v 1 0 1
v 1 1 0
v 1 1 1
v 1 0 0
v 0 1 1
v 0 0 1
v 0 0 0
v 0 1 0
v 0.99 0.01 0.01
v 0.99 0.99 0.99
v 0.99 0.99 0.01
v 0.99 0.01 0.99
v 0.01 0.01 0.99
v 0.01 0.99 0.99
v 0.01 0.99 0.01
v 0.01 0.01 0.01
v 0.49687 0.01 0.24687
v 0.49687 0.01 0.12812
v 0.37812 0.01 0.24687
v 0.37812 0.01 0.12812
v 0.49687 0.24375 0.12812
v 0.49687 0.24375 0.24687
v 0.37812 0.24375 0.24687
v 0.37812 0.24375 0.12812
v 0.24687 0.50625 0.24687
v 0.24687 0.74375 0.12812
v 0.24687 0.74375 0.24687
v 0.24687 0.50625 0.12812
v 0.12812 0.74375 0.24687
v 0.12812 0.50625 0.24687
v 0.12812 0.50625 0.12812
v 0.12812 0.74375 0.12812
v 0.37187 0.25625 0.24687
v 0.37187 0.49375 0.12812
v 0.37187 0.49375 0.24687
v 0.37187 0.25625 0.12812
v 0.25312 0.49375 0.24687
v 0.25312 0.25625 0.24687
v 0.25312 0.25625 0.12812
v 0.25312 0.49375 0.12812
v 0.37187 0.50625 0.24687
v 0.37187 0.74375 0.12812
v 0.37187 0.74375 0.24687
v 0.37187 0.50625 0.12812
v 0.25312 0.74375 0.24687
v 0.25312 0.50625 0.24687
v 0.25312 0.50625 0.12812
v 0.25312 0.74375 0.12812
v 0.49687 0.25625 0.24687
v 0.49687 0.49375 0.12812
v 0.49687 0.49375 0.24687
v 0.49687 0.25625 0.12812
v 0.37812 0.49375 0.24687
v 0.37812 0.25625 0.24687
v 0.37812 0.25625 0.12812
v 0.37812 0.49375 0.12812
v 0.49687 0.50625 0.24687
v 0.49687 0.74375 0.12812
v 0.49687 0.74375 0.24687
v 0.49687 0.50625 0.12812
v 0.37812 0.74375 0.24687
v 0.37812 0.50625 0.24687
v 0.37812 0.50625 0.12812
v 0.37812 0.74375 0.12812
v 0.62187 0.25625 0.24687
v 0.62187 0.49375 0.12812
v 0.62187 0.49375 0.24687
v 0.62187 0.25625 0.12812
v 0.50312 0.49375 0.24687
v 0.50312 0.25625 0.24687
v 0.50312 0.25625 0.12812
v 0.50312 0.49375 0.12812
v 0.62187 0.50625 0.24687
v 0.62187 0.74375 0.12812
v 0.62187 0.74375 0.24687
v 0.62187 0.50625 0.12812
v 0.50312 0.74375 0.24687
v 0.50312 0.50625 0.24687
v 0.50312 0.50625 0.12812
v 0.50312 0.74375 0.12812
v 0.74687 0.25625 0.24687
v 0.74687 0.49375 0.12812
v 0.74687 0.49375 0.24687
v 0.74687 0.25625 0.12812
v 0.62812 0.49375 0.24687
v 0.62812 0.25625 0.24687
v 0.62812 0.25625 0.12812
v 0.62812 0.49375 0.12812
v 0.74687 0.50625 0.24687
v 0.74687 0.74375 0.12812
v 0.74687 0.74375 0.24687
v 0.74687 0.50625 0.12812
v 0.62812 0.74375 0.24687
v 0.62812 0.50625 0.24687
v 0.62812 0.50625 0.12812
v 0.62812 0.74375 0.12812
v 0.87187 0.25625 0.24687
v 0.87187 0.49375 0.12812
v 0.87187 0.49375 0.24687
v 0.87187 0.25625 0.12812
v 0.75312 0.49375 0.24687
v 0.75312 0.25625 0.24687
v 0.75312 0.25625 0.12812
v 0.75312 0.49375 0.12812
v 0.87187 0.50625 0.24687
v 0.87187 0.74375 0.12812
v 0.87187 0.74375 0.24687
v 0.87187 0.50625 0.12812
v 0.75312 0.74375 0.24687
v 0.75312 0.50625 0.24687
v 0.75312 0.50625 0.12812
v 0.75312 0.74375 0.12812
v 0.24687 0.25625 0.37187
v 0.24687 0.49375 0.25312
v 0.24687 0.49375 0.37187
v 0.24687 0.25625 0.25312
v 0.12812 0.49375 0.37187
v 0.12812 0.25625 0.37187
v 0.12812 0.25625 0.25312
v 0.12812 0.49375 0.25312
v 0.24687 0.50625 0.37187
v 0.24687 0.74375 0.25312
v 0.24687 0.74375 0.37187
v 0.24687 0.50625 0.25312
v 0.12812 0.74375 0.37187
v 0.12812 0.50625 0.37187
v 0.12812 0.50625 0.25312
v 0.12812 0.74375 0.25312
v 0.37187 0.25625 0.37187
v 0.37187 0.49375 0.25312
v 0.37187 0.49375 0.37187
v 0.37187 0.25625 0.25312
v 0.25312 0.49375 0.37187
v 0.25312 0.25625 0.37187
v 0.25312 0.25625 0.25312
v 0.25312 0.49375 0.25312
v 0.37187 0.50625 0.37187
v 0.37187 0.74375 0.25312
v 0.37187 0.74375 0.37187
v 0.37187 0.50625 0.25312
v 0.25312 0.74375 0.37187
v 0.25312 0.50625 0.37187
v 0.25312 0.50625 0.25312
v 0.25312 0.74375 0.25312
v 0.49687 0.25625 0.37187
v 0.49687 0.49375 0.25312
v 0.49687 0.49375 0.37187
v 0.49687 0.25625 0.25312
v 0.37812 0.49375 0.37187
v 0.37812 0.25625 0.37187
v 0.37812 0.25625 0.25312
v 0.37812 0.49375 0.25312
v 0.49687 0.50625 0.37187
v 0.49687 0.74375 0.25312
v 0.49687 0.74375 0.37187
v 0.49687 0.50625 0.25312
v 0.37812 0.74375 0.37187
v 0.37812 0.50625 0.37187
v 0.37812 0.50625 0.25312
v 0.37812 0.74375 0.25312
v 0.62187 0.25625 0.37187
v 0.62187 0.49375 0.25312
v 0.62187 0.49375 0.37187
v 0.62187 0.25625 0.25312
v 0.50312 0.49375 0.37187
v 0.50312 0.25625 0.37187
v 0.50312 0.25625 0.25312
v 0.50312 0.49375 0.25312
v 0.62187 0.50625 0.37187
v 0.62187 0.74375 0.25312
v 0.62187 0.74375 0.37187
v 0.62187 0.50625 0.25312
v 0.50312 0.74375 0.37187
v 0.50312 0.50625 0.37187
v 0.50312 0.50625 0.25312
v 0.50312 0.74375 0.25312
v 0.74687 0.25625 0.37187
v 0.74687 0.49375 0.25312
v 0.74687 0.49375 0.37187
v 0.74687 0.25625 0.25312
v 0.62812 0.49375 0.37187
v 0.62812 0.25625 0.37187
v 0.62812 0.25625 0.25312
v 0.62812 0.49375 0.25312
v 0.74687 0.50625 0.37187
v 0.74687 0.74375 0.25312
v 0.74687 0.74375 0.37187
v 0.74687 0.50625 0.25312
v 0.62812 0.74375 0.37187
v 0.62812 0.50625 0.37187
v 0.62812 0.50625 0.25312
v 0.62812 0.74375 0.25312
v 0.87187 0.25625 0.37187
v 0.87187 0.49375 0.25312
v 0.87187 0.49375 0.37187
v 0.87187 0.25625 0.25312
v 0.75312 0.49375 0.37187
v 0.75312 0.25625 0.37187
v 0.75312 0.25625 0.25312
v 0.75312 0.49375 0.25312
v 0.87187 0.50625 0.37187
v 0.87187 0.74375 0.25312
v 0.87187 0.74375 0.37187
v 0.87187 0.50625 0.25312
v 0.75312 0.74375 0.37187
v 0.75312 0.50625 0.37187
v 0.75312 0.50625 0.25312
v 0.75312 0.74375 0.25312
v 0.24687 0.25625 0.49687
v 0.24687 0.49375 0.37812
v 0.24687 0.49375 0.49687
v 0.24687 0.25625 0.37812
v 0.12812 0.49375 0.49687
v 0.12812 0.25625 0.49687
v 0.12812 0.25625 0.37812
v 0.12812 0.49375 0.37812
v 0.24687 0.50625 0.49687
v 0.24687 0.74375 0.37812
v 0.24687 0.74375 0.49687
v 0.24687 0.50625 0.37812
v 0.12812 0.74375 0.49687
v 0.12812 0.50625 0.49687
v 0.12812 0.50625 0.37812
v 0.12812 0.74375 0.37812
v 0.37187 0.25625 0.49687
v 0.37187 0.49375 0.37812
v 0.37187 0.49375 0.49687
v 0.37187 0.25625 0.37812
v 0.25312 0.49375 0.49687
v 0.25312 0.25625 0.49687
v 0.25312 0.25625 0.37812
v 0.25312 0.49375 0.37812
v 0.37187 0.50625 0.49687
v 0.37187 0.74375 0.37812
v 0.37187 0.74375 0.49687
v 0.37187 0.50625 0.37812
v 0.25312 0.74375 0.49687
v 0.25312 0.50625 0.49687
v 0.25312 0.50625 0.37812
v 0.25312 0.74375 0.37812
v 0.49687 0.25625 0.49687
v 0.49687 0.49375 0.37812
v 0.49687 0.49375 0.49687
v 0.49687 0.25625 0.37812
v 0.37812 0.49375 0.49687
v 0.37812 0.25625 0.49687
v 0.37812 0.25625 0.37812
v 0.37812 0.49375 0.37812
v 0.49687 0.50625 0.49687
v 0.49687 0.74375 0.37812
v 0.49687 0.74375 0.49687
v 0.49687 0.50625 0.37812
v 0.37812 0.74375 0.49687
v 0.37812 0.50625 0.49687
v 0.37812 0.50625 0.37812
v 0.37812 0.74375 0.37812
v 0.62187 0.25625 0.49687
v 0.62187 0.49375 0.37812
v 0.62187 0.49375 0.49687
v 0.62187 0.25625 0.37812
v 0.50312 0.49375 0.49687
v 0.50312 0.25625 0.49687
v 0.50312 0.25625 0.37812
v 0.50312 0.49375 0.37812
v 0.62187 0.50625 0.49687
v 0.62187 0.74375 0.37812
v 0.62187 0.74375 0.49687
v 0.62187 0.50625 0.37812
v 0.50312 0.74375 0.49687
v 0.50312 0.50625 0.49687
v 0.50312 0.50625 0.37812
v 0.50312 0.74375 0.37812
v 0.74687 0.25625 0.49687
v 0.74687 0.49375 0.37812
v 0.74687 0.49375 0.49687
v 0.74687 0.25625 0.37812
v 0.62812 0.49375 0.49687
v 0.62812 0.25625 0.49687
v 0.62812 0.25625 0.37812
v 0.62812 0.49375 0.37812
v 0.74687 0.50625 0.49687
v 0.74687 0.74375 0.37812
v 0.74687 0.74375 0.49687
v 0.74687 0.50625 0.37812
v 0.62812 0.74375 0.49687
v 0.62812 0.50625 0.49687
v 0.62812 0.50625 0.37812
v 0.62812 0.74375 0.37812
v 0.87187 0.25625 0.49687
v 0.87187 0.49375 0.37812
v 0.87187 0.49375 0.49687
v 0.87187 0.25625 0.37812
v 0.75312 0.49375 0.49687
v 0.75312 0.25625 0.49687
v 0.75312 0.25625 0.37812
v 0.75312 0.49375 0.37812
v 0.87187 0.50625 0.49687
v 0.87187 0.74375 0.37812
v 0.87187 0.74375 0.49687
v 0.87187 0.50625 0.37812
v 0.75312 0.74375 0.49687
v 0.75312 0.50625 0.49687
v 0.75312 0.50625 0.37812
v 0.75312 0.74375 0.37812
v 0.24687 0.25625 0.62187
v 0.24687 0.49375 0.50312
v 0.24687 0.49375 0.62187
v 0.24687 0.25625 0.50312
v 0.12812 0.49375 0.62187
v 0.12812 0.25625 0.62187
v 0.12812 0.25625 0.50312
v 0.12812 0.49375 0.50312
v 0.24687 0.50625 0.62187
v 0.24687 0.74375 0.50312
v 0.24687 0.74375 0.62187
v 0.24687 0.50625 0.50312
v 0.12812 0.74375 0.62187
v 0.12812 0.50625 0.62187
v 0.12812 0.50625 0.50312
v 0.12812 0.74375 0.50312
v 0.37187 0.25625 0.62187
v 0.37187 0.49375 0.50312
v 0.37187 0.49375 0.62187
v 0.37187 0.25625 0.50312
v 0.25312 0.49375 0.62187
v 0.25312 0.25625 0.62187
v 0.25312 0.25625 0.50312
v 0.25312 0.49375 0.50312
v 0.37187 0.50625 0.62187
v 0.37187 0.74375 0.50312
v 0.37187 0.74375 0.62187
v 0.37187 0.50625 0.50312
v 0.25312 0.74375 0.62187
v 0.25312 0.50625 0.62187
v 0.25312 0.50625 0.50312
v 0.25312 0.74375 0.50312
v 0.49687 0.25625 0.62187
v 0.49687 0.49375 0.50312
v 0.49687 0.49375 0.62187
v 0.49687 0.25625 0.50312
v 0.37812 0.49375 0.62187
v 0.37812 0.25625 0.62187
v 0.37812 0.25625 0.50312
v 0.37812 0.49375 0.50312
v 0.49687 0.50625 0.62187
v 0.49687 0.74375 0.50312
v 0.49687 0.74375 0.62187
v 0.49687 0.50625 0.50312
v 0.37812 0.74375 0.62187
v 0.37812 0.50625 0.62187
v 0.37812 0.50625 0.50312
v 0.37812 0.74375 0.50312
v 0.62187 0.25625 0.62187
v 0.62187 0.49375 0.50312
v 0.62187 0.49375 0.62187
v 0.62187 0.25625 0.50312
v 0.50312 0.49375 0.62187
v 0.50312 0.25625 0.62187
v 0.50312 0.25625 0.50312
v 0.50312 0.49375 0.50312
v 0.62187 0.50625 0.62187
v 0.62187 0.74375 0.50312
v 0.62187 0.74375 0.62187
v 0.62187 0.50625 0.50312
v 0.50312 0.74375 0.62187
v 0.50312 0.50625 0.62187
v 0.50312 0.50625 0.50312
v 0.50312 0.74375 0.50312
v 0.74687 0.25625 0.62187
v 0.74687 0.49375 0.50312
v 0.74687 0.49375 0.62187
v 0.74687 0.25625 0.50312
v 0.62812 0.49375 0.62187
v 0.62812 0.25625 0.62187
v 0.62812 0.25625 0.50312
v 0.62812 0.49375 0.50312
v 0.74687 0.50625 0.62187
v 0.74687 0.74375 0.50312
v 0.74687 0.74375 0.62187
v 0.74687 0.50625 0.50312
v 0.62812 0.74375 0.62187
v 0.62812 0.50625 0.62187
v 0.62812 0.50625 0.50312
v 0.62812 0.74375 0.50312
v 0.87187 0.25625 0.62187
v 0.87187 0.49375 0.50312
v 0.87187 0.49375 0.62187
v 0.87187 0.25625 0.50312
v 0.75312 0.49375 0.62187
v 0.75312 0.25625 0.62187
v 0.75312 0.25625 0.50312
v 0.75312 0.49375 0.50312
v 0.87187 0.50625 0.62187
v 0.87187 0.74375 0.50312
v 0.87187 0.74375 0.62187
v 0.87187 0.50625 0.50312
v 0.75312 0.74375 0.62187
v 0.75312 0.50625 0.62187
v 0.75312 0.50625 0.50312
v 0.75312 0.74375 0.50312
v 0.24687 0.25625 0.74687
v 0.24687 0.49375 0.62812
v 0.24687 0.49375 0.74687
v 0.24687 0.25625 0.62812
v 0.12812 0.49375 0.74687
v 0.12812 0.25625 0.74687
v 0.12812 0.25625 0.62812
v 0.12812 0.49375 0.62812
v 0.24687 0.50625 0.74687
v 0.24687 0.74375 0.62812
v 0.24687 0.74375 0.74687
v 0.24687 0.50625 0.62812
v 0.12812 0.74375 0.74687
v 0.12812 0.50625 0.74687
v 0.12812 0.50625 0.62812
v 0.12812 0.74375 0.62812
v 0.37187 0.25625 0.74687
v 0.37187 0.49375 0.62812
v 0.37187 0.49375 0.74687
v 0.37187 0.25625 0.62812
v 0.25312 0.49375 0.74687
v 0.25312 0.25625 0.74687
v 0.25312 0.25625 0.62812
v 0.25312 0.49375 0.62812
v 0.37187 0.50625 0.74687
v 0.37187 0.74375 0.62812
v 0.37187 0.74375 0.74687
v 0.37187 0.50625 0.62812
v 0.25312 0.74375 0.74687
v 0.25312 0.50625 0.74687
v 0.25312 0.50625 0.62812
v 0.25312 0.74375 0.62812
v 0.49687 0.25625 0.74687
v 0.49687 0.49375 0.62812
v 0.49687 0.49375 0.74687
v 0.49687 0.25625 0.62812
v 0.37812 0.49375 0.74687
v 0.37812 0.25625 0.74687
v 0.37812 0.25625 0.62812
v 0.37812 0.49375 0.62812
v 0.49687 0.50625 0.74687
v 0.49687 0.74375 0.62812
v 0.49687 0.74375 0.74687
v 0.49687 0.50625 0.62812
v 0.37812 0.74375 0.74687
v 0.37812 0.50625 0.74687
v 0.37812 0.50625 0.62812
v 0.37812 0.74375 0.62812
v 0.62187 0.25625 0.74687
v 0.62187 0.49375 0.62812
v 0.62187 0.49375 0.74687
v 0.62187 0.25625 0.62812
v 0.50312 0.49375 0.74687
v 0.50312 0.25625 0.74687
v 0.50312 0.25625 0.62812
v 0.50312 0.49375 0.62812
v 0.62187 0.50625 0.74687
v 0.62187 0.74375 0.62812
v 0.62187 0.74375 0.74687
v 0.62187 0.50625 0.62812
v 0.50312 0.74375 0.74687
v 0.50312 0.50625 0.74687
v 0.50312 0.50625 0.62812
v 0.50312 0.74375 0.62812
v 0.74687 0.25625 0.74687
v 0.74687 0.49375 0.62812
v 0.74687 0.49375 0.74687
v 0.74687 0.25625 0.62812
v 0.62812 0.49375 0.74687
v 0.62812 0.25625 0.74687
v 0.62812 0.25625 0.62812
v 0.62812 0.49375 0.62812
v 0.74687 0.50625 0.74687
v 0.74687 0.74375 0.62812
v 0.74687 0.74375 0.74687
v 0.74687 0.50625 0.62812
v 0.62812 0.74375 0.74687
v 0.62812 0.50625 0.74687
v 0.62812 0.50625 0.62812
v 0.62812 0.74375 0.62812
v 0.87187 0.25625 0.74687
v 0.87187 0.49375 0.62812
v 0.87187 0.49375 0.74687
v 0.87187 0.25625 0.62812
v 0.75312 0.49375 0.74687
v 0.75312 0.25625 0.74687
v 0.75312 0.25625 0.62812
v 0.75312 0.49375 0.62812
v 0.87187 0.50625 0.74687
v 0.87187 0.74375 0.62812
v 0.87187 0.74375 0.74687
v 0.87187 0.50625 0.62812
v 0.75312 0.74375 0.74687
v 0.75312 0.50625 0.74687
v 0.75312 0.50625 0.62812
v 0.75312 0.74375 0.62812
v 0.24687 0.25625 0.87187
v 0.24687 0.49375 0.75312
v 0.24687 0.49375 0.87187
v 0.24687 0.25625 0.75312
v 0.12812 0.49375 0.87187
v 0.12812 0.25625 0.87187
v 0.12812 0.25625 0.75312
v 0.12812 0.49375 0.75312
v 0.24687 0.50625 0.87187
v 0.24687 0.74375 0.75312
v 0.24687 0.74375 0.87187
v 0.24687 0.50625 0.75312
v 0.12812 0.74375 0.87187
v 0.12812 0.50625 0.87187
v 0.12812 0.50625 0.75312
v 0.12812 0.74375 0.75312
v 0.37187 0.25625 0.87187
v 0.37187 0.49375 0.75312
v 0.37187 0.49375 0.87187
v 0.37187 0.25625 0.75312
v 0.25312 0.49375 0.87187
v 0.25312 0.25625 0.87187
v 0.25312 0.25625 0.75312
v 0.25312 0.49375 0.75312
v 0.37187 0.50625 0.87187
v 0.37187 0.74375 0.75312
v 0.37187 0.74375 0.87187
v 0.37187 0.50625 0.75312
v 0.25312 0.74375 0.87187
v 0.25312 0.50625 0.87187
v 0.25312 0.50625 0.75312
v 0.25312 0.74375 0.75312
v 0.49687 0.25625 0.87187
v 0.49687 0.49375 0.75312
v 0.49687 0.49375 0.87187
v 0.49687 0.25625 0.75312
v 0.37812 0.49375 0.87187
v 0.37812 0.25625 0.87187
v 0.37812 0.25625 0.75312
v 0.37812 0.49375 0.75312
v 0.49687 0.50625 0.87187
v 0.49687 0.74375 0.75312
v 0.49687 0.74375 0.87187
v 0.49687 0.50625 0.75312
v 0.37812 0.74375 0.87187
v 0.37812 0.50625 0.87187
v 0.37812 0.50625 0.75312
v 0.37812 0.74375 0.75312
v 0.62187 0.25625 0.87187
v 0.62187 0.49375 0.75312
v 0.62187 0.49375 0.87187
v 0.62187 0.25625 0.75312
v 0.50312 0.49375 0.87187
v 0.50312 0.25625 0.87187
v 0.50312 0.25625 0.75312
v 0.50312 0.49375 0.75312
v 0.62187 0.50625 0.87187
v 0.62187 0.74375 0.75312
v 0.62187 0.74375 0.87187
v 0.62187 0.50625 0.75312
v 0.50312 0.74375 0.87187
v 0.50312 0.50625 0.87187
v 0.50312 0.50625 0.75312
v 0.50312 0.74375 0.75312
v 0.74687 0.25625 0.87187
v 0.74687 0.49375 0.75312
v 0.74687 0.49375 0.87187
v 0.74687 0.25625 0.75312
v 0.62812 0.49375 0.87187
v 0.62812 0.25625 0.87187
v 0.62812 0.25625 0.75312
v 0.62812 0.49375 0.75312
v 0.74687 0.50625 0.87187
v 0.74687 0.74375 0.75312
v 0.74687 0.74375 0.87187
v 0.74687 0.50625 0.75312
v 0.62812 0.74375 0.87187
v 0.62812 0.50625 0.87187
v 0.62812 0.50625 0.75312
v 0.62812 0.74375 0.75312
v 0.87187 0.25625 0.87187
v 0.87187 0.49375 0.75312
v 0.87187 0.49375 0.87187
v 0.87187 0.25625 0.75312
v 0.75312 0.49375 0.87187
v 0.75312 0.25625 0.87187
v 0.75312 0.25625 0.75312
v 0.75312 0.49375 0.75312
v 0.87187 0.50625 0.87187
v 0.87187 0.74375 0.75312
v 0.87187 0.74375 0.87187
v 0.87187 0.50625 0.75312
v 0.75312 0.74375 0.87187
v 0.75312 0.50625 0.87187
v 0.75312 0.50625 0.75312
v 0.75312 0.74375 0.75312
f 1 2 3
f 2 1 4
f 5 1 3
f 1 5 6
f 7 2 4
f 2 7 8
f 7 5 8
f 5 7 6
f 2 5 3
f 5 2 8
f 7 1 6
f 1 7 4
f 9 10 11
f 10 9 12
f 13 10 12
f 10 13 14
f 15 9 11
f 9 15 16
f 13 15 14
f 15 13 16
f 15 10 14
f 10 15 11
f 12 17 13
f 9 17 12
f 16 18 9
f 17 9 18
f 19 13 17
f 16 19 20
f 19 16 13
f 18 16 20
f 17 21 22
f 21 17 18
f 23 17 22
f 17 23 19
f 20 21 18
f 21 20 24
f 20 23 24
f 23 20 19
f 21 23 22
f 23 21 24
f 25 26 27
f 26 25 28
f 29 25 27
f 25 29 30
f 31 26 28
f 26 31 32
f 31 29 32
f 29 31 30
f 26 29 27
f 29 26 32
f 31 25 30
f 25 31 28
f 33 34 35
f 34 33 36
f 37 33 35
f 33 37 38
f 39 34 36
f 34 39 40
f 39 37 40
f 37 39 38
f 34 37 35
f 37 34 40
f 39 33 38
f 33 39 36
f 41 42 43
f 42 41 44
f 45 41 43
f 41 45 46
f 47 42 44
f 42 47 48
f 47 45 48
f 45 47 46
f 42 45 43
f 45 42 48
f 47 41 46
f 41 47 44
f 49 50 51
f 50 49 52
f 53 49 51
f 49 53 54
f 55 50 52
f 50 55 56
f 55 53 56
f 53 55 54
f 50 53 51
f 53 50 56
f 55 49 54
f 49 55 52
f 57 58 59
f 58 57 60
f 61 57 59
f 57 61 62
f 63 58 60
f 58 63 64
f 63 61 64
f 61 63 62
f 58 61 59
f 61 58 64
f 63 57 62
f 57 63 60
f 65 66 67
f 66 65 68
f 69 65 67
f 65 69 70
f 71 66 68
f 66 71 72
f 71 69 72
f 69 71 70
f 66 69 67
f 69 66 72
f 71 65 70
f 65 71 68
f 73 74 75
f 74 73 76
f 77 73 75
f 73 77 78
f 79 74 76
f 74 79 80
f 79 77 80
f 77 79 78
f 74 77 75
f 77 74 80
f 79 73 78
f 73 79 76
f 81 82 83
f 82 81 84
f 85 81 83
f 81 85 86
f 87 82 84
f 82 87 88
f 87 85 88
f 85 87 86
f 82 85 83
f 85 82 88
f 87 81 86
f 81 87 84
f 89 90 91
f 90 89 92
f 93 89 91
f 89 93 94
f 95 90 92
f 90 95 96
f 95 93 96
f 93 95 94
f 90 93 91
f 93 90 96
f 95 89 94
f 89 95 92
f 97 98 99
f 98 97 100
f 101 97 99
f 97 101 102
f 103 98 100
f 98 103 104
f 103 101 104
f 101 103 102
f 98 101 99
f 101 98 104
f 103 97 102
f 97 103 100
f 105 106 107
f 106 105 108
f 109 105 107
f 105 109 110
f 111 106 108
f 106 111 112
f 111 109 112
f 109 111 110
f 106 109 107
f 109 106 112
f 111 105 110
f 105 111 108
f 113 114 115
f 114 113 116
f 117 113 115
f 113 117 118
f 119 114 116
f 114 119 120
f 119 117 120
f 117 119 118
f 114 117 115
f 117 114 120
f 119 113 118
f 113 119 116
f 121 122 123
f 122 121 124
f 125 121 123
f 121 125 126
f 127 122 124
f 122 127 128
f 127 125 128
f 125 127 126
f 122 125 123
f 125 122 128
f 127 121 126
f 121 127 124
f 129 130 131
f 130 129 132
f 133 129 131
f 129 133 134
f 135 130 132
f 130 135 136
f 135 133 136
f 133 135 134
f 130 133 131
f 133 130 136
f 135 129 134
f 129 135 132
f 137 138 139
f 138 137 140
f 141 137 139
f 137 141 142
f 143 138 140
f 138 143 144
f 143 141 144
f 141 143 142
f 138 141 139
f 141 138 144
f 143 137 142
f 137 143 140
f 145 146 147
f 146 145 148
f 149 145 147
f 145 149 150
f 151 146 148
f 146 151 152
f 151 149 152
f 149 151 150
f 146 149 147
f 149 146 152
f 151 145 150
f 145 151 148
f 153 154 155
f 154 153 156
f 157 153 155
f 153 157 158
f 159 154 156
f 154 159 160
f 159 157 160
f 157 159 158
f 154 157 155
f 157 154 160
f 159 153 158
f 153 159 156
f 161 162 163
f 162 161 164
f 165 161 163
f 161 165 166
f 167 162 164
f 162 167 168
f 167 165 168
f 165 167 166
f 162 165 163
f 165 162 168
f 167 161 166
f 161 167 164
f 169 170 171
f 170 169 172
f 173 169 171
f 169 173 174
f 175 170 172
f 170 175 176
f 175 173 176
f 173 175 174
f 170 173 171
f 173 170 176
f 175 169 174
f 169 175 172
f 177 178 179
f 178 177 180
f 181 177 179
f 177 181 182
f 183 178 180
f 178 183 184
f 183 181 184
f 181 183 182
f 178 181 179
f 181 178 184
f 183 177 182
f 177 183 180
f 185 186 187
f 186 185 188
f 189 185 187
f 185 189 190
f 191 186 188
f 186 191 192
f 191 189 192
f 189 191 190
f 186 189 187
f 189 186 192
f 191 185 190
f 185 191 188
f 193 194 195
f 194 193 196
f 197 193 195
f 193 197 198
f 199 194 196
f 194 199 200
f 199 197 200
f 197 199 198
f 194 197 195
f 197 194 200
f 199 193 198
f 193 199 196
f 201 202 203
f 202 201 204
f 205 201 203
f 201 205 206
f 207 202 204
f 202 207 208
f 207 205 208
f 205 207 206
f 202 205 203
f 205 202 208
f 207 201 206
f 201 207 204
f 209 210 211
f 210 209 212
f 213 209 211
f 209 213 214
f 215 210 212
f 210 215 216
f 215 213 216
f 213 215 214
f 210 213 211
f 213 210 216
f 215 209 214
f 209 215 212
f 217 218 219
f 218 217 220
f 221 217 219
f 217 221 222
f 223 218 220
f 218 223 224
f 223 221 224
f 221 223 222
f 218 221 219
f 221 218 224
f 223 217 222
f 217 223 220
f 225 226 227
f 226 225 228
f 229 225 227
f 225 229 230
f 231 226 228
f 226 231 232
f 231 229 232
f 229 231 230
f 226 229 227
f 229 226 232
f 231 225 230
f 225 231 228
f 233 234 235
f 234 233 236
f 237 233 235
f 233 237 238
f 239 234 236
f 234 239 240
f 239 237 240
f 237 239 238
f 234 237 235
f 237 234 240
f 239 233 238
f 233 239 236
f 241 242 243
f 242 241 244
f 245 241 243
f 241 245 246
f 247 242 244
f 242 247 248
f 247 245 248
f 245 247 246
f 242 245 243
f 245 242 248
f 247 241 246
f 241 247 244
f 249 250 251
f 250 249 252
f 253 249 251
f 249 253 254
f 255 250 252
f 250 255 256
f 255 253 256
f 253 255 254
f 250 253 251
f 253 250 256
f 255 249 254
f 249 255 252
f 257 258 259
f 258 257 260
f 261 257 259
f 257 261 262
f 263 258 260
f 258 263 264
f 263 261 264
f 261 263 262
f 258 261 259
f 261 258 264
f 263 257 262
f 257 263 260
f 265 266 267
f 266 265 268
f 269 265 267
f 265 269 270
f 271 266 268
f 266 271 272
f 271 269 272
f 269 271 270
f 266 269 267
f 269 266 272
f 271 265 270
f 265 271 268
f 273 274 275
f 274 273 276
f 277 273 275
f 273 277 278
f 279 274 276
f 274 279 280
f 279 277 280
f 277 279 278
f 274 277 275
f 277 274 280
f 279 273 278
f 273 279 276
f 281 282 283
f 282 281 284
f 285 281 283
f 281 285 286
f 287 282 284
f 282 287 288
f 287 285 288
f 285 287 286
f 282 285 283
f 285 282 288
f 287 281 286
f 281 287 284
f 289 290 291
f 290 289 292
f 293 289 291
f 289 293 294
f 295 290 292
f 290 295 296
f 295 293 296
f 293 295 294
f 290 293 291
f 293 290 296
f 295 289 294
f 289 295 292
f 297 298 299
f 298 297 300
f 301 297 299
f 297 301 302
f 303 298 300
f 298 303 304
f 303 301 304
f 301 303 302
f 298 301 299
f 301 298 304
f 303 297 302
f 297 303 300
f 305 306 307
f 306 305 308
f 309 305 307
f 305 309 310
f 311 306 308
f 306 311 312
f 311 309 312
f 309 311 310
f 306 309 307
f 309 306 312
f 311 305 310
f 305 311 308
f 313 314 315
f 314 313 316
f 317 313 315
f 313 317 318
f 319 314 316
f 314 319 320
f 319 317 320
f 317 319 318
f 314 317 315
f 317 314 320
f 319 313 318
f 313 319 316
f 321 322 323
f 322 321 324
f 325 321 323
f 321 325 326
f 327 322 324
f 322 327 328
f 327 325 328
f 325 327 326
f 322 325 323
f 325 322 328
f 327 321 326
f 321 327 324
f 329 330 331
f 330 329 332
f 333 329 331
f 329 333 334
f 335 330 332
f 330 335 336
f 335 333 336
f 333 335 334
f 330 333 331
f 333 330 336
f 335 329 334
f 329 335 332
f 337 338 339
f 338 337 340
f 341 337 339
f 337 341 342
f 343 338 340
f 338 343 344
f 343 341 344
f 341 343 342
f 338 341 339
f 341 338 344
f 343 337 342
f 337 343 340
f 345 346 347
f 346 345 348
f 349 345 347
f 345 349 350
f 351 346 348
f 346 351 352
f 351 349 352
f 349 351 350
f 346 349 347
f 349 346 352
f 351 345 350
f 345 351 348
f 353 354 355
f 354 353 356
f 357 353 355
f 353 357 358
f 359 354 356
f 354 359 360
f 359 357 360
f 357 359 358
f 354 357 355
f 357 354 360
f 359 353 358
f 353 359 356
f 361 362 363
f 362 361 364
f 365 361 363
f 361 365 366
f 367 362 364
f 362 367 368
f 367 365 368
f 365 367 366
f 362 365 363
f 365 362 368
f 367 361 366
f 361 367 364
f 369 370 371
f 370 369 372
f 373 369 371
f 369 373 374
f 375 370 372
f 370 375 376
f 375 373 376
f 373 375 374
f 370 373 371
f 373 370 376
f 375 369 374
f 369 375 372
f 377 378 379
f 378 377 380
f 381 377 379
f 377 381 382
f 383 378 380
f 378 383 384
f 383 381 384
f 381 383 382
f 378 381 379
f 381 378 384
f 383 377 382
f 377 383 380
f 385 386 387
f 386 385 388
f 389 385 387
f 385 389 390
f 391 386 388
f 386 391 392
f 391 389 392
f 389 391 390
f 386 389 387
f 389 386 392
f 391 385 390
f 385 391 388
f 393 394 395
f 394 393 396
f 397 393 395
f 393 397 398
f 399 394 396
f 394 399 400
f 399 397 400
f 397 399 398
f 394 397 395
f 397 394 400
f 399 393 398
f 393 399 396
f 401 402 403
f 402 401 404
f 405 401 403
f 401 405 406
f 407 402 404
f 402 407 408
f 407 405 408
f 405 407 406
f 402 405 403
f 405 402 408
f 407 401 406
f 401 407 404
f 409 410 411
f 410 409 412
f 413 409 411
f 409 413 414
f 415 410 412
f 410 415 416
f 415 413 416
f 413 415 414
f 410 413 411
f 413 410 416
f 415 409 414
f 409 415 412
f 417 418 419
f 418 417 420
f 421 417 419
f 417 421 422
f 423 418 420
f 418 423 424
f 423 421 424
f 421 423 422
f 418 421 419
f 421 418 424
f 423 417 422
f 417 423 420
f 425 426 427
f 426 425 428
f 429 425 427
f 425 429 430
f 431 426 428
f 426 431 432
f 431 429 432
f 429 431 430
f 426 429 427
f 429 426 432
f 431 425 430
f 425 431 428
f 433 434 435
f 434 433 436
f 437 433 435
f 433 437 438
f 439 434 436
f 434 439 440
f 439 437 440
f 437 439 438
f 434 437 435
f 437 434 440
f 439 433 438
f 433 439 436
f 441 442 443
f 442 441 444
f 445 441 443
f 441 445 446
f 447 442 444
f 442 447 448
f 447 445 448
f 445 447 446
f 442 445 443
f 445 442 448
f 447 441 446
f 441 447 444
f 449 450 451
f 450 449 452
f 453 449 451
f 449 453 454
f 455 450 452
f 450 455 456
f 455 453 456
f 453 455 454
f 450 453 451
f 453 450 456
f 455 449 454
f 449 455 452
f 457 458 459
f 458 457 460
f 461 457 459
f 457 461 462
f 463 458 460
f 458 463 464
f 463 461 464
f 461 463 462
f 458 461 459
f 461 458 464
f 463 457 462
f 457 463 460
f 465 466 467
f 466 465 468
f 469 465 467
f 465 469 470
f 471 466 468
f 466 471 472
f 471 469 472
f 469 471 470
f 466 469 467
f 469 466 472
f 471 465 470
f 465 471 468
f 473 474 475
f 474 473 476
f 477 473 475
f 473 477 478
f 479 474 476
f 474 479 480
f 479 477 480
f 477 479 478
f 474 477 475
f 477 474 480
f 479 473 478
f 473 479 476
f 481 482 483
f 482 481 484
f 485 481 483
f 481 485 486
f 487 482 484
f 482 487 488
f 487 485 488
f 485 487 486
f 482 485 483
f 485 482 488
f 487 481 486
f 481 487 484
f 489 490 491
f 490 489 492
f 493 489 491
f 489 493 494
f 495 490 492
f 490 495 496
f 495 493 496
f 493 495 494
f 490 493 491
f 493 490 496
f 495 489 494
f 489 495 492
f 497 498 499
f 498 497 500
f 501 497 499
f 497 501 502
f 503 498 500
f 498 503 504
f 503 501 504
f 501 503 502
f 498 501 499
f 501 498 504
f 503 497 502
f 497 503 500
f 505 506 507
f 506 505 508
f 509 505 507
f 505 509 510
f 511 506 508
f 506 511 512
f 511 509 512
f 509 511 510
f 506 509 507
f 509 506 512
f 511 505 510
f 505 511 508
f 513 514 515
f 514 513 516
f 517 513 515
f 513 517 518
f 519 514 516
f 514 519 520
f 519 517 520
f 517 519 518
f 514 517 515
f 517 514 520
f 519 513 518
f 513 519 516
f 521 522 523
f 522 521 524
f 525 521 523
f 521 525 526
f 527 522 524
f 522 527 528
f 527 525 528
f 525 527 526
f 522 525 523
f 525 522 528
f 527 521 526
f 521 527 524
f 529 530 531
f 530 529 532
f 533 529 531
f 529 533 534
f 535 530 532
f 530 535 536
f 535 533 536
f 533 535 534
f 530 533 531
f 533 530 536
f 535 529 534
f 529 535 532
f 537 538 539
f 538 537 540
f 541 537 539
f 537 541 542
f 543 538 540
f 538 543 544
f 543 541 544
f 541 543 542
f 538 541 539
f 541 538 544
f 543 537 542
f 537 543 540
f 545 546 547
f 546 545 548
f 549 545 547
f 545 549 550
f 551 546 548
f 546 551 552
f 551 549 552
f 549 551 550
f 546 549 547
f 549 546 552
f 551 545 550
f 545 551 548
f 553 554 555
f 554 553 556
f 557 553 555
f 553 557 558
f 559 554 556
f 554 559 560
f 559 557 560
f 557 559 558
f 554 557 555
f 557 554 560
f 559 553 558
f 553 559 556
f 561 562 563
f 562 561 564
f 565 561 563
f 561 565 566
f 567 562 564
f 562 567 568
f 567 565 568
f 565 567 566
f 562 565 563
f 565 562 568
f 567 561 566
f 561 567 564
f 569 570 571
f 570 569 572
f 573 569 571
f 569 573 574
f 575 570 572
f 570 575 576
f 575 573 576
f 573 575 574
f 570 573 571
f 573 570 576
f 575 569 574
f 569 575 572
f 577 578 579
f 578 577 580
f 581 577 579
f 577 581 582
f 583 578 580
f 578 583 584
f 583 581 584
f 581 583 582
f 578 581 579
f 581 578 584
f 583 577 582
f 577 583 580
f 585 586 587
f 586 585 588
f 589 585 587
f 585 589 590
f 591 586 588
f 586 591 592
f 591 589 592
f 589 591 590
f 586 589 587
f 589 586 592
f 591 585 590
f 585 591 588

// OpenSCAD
translate([0.4375, 0.125, 0.1875]) color([0.9299657453863941, 0.7772449038818431, 0.06983428787122925]) cube([0.11875, 0.2375, 0.11875], center=true);
translate([0.1875, 0.625, 0.1875]) color([0.6376859862265117, 0.03409704991680973, 0.522538302308322]) cube([0.11875, 0.2375, 0.11875], center=true);
translate([0.3125, 0.375, 0.1875]) color([0.2261802976720272, 0.7229034706324774, 0.5377526138146049]) cube([0.11875, 0.2375, 0.11875], center=true);
translate([0.3125, 0.625, 0.1875]) color([0.4456090410263376, 0.15796204680276515, 0.45047659950415087]) cube([0.11875, 0.2375, 0.11875], center=true);
translate([0.4375, 0.375, 0.1875]) color([0.5490820050678208, 0.14686047752322706, 0.5617362490560353]) cube([0.11875, 0.2375, 0.11875], center=true);
translate([0.4375, 0.625, 0.1875]) color([0.8225749139381848, 0.3319934260607137, 0.3017168159245299]) cube([0.11875, 0.2375, 0.11875], center=true);
translate([0.5625, 0.375, 0.1875]) color([0.7025487815936575, 0.375706464733934, 0.5190584697115778]) cube([0.11875, 0.2375, 0.11875], center=true);
translate([0.5625, 0.625, 0.1875]) color([0.6521062753497244, 0.8302030377249914, 0.6343217710140557]) cube([0.11875, 0.2375, 0.11875], center=true);
translate([0.6875, 0.375, 0.1875]) color([0.40790619207709244, 0.9826385995255463, 0.28156390079137217]) cube([0.11875, 0.2375, 0.11875], center=true);
translate([0.6875, 0.625, 0.1875]) color([0.8151006902640158, 0.462579138394799, 0.7278590964294446]) cube([0.11875, 0.2375, 0.11875], center=true);
translate([0.8125, 0.375, 0.1875]) color([0.2835380427428842, 0.4012608558084624, 0.5323065298191685]) cube([0.11875, 0.2375, 0.11875], center=true);
translate([0.8125, 0.625, 0.1875]) color([0.29496428940021147, 0.4427375862082985, 0.2941850013510633]) cube([0.11875, 0.2375, 0.11875], center=true);
translate([0.1875, 0.375, 0.3125]) color([0.15941938427686497, 0.32274459379293663, 0.32765800555941504]) cube([0.11875, 0.2375, 0.11875], center=true);
translate([0.1875, 0.625, 0.3125]) color([0.4834859396121016, 0.9037701422964793, 0.5779546522895093]) cube([0.11875, 0.2375, 0.11875], center=true);
translate([0.3125, 0.375, 0.3125]) color([0.06968675095028609, 0.11895938573272857, 0.048739422880219596]) cube([0.11875, 0.2375, 0.11875], center=true);
translate([0.3125, 0.625, 0.3125]) color([0.680806689696483, 0.4680601977633927, 0.26033280709677864]) cube([0.11875, 0.2375, 0.11875], center=true);
translate([0.4375, 0.375, 0.3125]) color([0.5719339306295437, 0.404252542227601, 0.6786146775095532]) cube([0.11875, 0.2375, 0.11875], center=true);
translate([0.4375, 0.625, 0.3125]) color([0.28047812724436805, 0.27002596219615704, 0.8364754442772583]) cube([0.11875, 0.2375, 0.11875], center=true);
translate([0.5625, 0.375, 0.3125]) color([0.24773089983763596, 0.6336010549096505, 0.5884725969870764]) cube([0.11875, 0.2375, 0.11875], center=true);
translate([0.5625, 0.625, 0.3125]) color([0.9005118055547944, 0.31779377257405916, 0.25274224790327116]) cube([0.11875, 0.2375, 0.11875], center=true);
translate([0.6875, 0.375, 0.3125]) color([0.6298864544015497, 0.7892380437982945, 0.5225882686986693]) cube([0.11875, 0.2375, 0.11875], center=true);
translate([0.6875, 0.625, 0.3125]) color([0.28195461649301323, 0.6934585195802009, 0.5124929071622868]) cube([0.11875, 0.2375, 0.11875], center=true);
translate([0.8125, 0.375, 0.3125]) color([0.11984310900660533, 0.6513087644515249, 0.03970878592720872]) cube([0.11875, 0.2375, 0.11875], center=true);
translate([0.8125, 0.625, 0.3125]) color([0.7003929225711334, 0.7808382214492322, 0.20155569840547516]) cube([0.11875, 0.2375, 0.11875], center=true);
translate([0.1875, 0.375, 0.4375]) color([0.1183925721169371, 0.1841844438638104, 0.39183158470059143]) cube([0.11875, 0.2375, 0.11875], center=true);
translate([0.1875, 0.625, 0.4375]) color([0.7880565415193588, 0.46138389476320407, 0.06652470957712675]) cube([0.11875, 0.2375, 0.11875], center=true);
translate([0.3125, 0.375, 0.4375]) color([0.588211550081641, 0.6399317423118057, 0.007217490345742372]) cube([0.11875, 0.2375, 0.11875], center=true);
translate([0.3125, 0.625, 0.4375]) color([0.3532565863114173, 0.35637186190320147, 0.7342087590911364]) cube([0.11875, 0.2375, 0.11875], center=true);
translate([0.4375, 0.375, 0.4375]) color([0.5336697076618003, 0.0710060334126964, 0.32716435103887487]) cube([0.11875, 0.2375, 0.11875], center=true);
translate([0.4375, 0.625, 0.4375]) color([0.441341125864646, 0.45762128435333027, 0.4092776003874785]) cube([0.11875, 0.2375, 0.11875], center=true);
translate([0.5625, 0.375, 0.4375]) color([0.8756428361109051, 0.4561344262531759, 0.15598386755622373]) cube([0.11875, 0.2375, 0.11875], center=true);
translate([0.5625, 0.625, 0.4375]) color([0.3830292326051773, 0.6562707746661827, 0.6744722440233193]) cube([0.11875, 0.2375, 0.11875], center=true);
translate([0.6875, 0.375, 0.4375]) color([0.243370648746553, 0.22507511564075489, 0.06757234207745633]) cube([0.11875, 0.2375, 0.11875], center=true);
translate([0.6875, 0.625, 0.4375]) color([0.8367304159698702, 0.04297885567948634, 0.1674740521817063]) cube([0.11875, 0.2375, 0.11875], center=true);
translate([0.8125, 0.375, 0.4375]) color([0.5635467348798714, 0.10850289092092236, 0.8014723289181159]) cube([0.11875, 0.2375, 0.11875], center=true);
translate([0.8125, 0.625, 0.4375]) color([0.7545468807608136, 0.1883470291661281, 0.034743431192791885]) cube([0.11875, 0.2375, 0.11875], center=true);
translate([0.1875, 0.375, 0.5625]) color([0.9880734415652127, 0.1002990188096855, 0.010785300779343032]) cube([0.11875, 0.2375, 0.11875], center=true);
translate([0.1875, 0.625, 0.5625]) color([0.28353358681124896, 0.7601491328152165, 0.19561520202589988]) cube([0.11875, 0.2375, 0.11875], center=true);
translate([0.3125, 0.375, 0.5625]) color([0.22158668099703138, 0.5906023814056302, 0.13645271976656093]) cube([0.11875, 0.2375, 0.11875], center=true);
translate([0.3125, 0.625, 0.5625]) color([0.3301732635619884, 0.4522708921928007, 0.9044600330066472]) cube([0.11875, 0.2375, 0.11875], center=true);
translate([0.4375, 0.375, 0.5625]) color([0.4872715578546214, 0.08102168714882252, 0.5992946293087188]) cube([0.11875, 0.2375, 0.11875], center=true);
translate([0.4375, 0.625, 0.5625]) color([0.25554578009532947, 0.1265682946137341, 0.28455182829955994]) cube([0.11875, 0.2375, 0.11875], center=true);
translate([0.5625, 0.375, 0.5625]) color([0.2865834675032647, 0.8160578131136546, 0.6426390257358862]) cube([0.11875, 0.2375, 0.11875], center=true);
translate([0.5625, 0.625, 0.5625]) color([0.7717136715868417, 0.6404735639366795, 0.5069955417170721]) cube([0.11875, 0.2375, 0.11875], center=true);
translate([0.6875, 0.375, 0.5625]) color([0.5392115106919976, 0.6353698590669343, 0.20580572586916968]) cube([0.11875, 0.2375, 0.11875], center=true);
translate([0.6875, 0.625, 0.5625]) color([0.915828987453624, 0.9049856231573957, 0.24268591766185865]) cube([0.11875, 0.2375, 0.11875], center=true);
translate([0.8125, 0.375, 0.5625]) color([0.10194456724776513, 0.949846592562836, 0.740995778496533]) cube([0.11875, 0.2375, 0.11875], center=true);
translate([0.8125, 0.625, 0.5625]) color([0.8729669852206786, 0.25272156311228, 0.054144670922209204]) cube([0.11875, 0.2375, 0.11875], center=true);
translate([0.1875, 0.375, 0.6875]) color([0.729677681017465, 0.30725287227977593, 0.921227576774244]) cube([0.11875, 0.2375, 0.11875], center=true);
translate([0.1875, 0.625, 0.6875]) color([0.9403116470896689, 0.4632385713543439, 0.18155226743195452]) cube([0.11875, 0.2375, 0.11875], center=true);
translate([0.3125, 0.375, 0.6875]) color([0.7555139778062063, 0.7444668566034112, 0.9544331035596492]) cube([0.11875, 0.2375, 0.11875], center=true);
translate([0.3125, 0.625, 0.6875]) color([0.230578377599014, 0.23681979757290195, 0.24054682179300135]) cube([0.11875, 0.2375, 0.11875], center=true);
translate([0.4375, 0.375, 0.6875]) color([0.9035531900733258, 0.8620260595254998, 0.8795480291335148]) cube([0.11875, 0.2375, 0.11875], center=true);
translate([0.4375, 0.625, 0.6875]) color([0.15808335910978366, 0.7808914086935214, 0.5917230362648299]) cube([0.11875, 0.2375, 0.11875], center=true);
translate([0.5625, 0.375, 0.6875]) color([0.6520094379890793, 0.023255315523586173, 0.40834309611511843]) cube([0.11875, 0.2375, 0.11875], center=true);
translate([0.5625, 0.625, 0.6875]) color([0.6491479472383901, 0.09577884682196613, 0.2527460347881375]) cube([0.11875, 0.2375, 0.11875], center=true);
translate([0.6875, 0.375, 0.6875]) color([0.07499621853907357, 0.42501336439745274, 0.42920199434133366]) cube([0.11875, 0.2375, 0.11875], center=true);
translate([0.6875, 0.625, 0.6875]) color([0.06480529506889376, 0.14337834548813255, 0.35705332812350543]) cube([0.11875, 0.2375, 0.11875], center=true);
translate([0.8125, 0.375, 0.6875]) color([0.8272709443712007, 0.9857887347002262, 0.8562528215898045]) cube([0.11875, 0.2375, 0.11875], center=true);
translate([0.8125, 0.625, 0.6875]) color([0.5569367082441643, 0.9355521871650204, 0.2511276449272837]) cube([0.11875, 0.2375, 0.11875], center=true);
translate([0.1875, 0.375, 0.8125]) color([0.24868527117274986, 0.47956783859165963, 0.3476513516366909]) cube([0.11875, 0.2375, 0.11875], center=true);
translate([0.1875, 0.625, 0.8125]) color([0.189219992921129, 0.5721930032526805, 0.49909233862074776]) cube([0.11875, 0.2375, 0.11875], center=true);
translate([0.3125, 0.375, 0.8125]) color([0.6220367024763893, 0.5424261197037629, 0.13025594845525723]) cube([0.11875, 0.2375, 0.11875], center=true);
translate([0.3125, 0.625, 0.8125]) color([0.1394219800440767, 0.4964291608414597, 0.3918554789078038]) cube([0.11875, 0.2375, 0.11875], center=true);
translate([0.4375, 0.375, 0.8125]) color([0.9733423541048373, 0.9891408639263443, 0.034014634850142555]) cube([0.11875, 0.2375, 0.11875], center=true);
translate([0.4375, 0.625, 0.8125]) color([0.19834662665226666, 0.23284310580518652, 0.14436646185047808]) cube([0.11875, 0.2375, 0.11875], center=true);
translate([0.5625, 0.375, 0.8125]) color([0.092685547886313, 0.39738255998435623, 0.19867152848398328]) cube([0.11875, 0.2375, 0.11875], center=true);
translate([0.5625, 0.625, 0.8125]) color([0.1662215350615429, 0.8397518831190905, 0.6272582473014073]) cube([0.11875, 0.2375, 0.11875], center=true);
translate([0.6875, 0.375, 0.8125]) color([0.9799212741976538, 0.8257257842272026, 0.49045121346068343]) cube([0.11875, 0.2375, 0.11875], center=true);
translate([0.6875, 0.625, 0.8125]) color([0.3689958401603376, 0.08186728713396829, 0.31690074562744064]) cube([0.11875, 0.2375, 0.11875], center=true);
translate([0.8125, 0.375, 0.8125]) color([0.3145584324830545, 0.24954980065739973, 0.5700111538880018]) cube([0.11875, 0.2375, 0.11875], center=true);
translate([0.8125, 0.625, 0.8125]) color([0.08437902356358329, 0.4590102462479744, 0.5368670370580864]) cube([0.11875, 0.2375, 0.11875], center=true);
color([0.3,0.3,0.3,0.3]) difference() { cube([1,1,1]); translate([0.01,0.01,0.01]) cube([0.98,0.98,0.98]); }
